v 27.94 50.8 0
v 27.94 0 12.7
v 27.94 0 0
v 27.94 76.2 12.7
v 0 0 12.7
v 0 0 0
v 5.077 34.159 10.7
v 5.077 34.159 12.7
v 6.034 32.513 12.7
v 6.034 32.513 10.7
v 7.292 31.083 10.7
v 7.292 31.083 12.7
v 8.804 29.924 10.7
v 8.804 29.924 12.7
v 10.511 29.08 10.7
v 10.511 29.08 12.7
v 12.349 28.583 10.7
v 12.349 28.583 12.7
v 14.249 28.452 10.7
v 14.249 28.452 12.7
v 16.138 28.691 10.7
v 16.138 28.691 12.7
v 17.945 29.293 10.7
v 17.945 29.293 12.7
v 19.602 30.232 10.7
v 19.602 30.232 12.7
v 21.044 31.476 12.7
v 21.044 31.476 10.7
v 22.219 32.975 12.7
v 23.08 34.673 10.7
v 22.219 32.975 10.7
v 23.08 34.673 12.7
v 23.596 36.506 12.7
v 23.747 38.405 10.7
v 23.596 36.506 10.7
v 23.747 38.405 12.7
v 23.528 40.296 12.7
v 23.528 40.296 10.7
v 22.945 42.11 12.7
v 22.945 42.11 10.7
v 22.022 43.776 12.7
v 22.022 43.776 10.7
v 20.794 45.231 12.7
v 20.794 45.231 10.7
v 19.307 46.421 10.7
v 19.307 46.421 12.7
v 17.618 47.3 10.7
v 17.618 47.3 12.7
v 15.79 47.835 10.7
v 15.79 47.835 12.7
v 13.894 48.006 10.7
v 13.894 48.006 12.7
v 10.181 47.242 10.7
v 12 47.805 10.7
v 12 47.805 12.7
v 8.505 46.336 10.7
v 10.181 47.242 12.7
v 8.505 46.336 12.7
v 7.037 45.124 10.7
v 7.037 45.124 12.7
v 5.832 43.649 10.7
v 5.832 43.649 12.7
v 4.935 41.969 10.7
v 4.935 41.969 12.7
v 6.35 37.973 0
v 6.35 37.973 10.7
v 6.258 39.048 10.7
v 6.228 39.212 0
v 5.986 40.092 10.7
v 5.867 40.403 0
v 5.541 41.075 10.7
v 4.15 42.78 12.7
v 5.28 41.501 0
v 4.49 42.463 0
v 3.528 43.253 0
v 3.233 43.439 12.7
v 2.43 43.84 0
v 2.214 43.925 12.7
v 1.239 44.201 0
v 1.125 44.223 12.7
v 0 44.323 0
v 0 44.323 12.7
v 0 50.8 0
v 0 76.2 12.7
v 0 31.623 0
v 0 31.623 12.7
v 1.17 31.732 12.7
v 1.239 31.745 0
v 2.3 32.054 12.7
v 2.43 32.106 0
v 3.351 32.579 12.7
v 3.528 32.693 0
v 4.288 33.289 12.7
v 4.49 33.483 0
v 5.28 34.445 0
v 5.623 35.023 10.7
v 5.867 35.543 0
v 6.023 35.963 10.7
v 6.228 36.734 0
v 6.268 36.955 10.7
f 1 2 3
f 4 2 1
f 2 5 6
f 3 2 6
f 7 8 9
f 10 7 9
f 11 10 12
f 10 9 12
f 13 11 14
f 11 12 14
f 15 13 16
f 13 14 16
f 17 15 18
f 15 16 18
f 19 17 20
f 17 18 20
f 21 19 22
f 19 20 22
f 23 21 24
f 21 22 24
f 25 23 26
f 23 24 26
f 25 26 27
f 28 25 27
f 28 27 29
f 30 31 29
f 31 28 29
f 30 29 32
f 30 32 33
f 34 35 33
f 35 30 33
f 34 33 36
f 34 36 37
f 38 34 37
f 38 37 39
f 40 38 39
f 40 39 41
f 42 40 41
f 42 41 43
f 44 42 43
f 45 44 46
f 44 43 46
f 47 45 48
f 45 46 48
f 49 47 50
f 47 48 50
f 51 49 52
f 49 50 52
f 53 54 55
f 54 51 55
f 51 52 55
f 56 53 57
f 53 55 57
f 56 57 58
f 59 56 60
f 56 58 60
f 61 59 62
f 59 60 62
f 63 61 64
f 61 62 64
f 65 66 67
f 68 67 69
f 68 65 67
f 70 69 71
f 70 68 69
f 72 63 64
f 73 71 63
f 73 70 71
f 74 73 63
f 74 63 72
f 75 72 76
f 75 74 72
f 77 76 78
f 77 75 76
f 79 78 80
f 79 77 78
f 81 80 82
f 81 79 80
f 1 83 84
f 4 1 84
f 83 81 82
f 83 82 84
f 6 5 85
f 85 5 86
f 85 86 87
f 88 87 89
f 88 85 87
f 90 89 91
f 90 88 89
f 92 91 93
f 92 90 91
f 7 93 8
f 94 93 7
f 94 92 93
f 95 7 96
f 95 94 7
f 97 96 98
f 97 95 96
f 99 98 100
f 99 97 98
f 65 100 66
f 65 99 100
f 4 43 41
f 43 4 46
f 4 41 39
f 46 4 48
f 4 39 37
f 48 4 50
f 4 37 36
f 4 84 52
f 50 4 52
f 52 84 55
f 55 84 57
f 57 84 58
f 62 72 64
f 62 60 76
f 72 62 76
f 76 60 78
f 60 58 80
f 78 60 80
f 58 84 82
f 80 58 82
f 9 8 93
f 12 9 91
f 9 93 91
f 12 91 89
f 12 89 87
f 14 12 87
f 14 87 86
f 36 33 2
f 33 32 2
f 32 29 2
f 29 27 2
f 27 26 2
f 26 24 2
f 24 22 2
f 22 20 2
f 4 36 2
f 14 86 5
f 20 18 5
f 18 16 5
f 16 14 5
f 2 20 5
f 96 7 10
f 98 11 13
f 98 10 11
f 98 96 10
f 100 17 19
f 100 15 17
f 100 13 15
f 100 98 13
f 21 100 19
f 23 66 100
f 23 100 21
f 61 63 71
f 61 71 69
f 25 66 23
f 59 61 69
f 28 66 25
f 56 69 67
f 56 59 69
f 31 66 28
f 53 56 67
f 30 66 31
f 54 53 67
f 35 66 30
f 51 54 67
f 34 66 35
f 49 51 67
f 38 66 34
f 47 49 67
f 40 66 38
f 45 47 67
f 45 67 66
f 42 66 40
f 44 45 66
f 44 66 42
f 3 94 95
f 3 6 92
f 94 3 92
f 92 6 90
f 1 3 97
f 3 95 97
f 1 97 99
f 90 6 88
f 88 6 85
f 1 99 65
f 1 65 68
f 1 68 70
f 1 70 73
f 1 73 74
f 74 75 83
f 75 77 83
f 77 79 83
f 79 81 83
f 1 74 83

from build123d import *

# Parameters (mm, degrees)
F1_DEPTH = 27.94
F2_R     = 9.779
F3_DEPTH = 2
F5_DEPTH = 25.4


with BuildPart() as f1:
    # F0 (on Right) → F1 (new body)
    with BuildSketch(Plane.YZ):
        Polygon((0, 12.7), (0, 0), (50.8, 0), (76.2, 12.7), align=None)
    extrude(amount=F1_DEPTH)

    # F2 (on face) → F3 (cut)
    with BuildSketch(Plane.XY.offset(12.7)):
        with Locations((13.97, 38.227)):
            Circle(F2_R)
    extrude(amount=-F3_DEPTH, mode=Mode.SUBTRACT)

    # F4 (on Top) → F5 (cut)
    with BuildSketch(Plane.XY):
        with BuildLine():
            ThreePointArc((0, 44.323), (-6.35, 37.973), (0, 31.623))
            Line((0, 31.623), (0, 37.973))
            Line((0, 37.973), (0, 44.323))
        make_face()
        with BuildLine():
            Line((0, 37.973), (0, 31.623))
            ThreePointArc((0, 31.623), (4.490128, 33.482872), (6.35, 37.973))
            Line((6.35, 37.973), (0, 37.973))
        make_face()
        with BuildLine():
            Line((0, 44.323), (0, 37.973))
            Line((0, 37.973), (6.35, 37.973))
            ThreePointArc((6.35, 37.973), (4.490128, 42.463128), (0, 44.323))
        make_face()
    extrude(amount=F5_DEPTH, mode=Mode.SUBTRACT)


solid = f1.part
